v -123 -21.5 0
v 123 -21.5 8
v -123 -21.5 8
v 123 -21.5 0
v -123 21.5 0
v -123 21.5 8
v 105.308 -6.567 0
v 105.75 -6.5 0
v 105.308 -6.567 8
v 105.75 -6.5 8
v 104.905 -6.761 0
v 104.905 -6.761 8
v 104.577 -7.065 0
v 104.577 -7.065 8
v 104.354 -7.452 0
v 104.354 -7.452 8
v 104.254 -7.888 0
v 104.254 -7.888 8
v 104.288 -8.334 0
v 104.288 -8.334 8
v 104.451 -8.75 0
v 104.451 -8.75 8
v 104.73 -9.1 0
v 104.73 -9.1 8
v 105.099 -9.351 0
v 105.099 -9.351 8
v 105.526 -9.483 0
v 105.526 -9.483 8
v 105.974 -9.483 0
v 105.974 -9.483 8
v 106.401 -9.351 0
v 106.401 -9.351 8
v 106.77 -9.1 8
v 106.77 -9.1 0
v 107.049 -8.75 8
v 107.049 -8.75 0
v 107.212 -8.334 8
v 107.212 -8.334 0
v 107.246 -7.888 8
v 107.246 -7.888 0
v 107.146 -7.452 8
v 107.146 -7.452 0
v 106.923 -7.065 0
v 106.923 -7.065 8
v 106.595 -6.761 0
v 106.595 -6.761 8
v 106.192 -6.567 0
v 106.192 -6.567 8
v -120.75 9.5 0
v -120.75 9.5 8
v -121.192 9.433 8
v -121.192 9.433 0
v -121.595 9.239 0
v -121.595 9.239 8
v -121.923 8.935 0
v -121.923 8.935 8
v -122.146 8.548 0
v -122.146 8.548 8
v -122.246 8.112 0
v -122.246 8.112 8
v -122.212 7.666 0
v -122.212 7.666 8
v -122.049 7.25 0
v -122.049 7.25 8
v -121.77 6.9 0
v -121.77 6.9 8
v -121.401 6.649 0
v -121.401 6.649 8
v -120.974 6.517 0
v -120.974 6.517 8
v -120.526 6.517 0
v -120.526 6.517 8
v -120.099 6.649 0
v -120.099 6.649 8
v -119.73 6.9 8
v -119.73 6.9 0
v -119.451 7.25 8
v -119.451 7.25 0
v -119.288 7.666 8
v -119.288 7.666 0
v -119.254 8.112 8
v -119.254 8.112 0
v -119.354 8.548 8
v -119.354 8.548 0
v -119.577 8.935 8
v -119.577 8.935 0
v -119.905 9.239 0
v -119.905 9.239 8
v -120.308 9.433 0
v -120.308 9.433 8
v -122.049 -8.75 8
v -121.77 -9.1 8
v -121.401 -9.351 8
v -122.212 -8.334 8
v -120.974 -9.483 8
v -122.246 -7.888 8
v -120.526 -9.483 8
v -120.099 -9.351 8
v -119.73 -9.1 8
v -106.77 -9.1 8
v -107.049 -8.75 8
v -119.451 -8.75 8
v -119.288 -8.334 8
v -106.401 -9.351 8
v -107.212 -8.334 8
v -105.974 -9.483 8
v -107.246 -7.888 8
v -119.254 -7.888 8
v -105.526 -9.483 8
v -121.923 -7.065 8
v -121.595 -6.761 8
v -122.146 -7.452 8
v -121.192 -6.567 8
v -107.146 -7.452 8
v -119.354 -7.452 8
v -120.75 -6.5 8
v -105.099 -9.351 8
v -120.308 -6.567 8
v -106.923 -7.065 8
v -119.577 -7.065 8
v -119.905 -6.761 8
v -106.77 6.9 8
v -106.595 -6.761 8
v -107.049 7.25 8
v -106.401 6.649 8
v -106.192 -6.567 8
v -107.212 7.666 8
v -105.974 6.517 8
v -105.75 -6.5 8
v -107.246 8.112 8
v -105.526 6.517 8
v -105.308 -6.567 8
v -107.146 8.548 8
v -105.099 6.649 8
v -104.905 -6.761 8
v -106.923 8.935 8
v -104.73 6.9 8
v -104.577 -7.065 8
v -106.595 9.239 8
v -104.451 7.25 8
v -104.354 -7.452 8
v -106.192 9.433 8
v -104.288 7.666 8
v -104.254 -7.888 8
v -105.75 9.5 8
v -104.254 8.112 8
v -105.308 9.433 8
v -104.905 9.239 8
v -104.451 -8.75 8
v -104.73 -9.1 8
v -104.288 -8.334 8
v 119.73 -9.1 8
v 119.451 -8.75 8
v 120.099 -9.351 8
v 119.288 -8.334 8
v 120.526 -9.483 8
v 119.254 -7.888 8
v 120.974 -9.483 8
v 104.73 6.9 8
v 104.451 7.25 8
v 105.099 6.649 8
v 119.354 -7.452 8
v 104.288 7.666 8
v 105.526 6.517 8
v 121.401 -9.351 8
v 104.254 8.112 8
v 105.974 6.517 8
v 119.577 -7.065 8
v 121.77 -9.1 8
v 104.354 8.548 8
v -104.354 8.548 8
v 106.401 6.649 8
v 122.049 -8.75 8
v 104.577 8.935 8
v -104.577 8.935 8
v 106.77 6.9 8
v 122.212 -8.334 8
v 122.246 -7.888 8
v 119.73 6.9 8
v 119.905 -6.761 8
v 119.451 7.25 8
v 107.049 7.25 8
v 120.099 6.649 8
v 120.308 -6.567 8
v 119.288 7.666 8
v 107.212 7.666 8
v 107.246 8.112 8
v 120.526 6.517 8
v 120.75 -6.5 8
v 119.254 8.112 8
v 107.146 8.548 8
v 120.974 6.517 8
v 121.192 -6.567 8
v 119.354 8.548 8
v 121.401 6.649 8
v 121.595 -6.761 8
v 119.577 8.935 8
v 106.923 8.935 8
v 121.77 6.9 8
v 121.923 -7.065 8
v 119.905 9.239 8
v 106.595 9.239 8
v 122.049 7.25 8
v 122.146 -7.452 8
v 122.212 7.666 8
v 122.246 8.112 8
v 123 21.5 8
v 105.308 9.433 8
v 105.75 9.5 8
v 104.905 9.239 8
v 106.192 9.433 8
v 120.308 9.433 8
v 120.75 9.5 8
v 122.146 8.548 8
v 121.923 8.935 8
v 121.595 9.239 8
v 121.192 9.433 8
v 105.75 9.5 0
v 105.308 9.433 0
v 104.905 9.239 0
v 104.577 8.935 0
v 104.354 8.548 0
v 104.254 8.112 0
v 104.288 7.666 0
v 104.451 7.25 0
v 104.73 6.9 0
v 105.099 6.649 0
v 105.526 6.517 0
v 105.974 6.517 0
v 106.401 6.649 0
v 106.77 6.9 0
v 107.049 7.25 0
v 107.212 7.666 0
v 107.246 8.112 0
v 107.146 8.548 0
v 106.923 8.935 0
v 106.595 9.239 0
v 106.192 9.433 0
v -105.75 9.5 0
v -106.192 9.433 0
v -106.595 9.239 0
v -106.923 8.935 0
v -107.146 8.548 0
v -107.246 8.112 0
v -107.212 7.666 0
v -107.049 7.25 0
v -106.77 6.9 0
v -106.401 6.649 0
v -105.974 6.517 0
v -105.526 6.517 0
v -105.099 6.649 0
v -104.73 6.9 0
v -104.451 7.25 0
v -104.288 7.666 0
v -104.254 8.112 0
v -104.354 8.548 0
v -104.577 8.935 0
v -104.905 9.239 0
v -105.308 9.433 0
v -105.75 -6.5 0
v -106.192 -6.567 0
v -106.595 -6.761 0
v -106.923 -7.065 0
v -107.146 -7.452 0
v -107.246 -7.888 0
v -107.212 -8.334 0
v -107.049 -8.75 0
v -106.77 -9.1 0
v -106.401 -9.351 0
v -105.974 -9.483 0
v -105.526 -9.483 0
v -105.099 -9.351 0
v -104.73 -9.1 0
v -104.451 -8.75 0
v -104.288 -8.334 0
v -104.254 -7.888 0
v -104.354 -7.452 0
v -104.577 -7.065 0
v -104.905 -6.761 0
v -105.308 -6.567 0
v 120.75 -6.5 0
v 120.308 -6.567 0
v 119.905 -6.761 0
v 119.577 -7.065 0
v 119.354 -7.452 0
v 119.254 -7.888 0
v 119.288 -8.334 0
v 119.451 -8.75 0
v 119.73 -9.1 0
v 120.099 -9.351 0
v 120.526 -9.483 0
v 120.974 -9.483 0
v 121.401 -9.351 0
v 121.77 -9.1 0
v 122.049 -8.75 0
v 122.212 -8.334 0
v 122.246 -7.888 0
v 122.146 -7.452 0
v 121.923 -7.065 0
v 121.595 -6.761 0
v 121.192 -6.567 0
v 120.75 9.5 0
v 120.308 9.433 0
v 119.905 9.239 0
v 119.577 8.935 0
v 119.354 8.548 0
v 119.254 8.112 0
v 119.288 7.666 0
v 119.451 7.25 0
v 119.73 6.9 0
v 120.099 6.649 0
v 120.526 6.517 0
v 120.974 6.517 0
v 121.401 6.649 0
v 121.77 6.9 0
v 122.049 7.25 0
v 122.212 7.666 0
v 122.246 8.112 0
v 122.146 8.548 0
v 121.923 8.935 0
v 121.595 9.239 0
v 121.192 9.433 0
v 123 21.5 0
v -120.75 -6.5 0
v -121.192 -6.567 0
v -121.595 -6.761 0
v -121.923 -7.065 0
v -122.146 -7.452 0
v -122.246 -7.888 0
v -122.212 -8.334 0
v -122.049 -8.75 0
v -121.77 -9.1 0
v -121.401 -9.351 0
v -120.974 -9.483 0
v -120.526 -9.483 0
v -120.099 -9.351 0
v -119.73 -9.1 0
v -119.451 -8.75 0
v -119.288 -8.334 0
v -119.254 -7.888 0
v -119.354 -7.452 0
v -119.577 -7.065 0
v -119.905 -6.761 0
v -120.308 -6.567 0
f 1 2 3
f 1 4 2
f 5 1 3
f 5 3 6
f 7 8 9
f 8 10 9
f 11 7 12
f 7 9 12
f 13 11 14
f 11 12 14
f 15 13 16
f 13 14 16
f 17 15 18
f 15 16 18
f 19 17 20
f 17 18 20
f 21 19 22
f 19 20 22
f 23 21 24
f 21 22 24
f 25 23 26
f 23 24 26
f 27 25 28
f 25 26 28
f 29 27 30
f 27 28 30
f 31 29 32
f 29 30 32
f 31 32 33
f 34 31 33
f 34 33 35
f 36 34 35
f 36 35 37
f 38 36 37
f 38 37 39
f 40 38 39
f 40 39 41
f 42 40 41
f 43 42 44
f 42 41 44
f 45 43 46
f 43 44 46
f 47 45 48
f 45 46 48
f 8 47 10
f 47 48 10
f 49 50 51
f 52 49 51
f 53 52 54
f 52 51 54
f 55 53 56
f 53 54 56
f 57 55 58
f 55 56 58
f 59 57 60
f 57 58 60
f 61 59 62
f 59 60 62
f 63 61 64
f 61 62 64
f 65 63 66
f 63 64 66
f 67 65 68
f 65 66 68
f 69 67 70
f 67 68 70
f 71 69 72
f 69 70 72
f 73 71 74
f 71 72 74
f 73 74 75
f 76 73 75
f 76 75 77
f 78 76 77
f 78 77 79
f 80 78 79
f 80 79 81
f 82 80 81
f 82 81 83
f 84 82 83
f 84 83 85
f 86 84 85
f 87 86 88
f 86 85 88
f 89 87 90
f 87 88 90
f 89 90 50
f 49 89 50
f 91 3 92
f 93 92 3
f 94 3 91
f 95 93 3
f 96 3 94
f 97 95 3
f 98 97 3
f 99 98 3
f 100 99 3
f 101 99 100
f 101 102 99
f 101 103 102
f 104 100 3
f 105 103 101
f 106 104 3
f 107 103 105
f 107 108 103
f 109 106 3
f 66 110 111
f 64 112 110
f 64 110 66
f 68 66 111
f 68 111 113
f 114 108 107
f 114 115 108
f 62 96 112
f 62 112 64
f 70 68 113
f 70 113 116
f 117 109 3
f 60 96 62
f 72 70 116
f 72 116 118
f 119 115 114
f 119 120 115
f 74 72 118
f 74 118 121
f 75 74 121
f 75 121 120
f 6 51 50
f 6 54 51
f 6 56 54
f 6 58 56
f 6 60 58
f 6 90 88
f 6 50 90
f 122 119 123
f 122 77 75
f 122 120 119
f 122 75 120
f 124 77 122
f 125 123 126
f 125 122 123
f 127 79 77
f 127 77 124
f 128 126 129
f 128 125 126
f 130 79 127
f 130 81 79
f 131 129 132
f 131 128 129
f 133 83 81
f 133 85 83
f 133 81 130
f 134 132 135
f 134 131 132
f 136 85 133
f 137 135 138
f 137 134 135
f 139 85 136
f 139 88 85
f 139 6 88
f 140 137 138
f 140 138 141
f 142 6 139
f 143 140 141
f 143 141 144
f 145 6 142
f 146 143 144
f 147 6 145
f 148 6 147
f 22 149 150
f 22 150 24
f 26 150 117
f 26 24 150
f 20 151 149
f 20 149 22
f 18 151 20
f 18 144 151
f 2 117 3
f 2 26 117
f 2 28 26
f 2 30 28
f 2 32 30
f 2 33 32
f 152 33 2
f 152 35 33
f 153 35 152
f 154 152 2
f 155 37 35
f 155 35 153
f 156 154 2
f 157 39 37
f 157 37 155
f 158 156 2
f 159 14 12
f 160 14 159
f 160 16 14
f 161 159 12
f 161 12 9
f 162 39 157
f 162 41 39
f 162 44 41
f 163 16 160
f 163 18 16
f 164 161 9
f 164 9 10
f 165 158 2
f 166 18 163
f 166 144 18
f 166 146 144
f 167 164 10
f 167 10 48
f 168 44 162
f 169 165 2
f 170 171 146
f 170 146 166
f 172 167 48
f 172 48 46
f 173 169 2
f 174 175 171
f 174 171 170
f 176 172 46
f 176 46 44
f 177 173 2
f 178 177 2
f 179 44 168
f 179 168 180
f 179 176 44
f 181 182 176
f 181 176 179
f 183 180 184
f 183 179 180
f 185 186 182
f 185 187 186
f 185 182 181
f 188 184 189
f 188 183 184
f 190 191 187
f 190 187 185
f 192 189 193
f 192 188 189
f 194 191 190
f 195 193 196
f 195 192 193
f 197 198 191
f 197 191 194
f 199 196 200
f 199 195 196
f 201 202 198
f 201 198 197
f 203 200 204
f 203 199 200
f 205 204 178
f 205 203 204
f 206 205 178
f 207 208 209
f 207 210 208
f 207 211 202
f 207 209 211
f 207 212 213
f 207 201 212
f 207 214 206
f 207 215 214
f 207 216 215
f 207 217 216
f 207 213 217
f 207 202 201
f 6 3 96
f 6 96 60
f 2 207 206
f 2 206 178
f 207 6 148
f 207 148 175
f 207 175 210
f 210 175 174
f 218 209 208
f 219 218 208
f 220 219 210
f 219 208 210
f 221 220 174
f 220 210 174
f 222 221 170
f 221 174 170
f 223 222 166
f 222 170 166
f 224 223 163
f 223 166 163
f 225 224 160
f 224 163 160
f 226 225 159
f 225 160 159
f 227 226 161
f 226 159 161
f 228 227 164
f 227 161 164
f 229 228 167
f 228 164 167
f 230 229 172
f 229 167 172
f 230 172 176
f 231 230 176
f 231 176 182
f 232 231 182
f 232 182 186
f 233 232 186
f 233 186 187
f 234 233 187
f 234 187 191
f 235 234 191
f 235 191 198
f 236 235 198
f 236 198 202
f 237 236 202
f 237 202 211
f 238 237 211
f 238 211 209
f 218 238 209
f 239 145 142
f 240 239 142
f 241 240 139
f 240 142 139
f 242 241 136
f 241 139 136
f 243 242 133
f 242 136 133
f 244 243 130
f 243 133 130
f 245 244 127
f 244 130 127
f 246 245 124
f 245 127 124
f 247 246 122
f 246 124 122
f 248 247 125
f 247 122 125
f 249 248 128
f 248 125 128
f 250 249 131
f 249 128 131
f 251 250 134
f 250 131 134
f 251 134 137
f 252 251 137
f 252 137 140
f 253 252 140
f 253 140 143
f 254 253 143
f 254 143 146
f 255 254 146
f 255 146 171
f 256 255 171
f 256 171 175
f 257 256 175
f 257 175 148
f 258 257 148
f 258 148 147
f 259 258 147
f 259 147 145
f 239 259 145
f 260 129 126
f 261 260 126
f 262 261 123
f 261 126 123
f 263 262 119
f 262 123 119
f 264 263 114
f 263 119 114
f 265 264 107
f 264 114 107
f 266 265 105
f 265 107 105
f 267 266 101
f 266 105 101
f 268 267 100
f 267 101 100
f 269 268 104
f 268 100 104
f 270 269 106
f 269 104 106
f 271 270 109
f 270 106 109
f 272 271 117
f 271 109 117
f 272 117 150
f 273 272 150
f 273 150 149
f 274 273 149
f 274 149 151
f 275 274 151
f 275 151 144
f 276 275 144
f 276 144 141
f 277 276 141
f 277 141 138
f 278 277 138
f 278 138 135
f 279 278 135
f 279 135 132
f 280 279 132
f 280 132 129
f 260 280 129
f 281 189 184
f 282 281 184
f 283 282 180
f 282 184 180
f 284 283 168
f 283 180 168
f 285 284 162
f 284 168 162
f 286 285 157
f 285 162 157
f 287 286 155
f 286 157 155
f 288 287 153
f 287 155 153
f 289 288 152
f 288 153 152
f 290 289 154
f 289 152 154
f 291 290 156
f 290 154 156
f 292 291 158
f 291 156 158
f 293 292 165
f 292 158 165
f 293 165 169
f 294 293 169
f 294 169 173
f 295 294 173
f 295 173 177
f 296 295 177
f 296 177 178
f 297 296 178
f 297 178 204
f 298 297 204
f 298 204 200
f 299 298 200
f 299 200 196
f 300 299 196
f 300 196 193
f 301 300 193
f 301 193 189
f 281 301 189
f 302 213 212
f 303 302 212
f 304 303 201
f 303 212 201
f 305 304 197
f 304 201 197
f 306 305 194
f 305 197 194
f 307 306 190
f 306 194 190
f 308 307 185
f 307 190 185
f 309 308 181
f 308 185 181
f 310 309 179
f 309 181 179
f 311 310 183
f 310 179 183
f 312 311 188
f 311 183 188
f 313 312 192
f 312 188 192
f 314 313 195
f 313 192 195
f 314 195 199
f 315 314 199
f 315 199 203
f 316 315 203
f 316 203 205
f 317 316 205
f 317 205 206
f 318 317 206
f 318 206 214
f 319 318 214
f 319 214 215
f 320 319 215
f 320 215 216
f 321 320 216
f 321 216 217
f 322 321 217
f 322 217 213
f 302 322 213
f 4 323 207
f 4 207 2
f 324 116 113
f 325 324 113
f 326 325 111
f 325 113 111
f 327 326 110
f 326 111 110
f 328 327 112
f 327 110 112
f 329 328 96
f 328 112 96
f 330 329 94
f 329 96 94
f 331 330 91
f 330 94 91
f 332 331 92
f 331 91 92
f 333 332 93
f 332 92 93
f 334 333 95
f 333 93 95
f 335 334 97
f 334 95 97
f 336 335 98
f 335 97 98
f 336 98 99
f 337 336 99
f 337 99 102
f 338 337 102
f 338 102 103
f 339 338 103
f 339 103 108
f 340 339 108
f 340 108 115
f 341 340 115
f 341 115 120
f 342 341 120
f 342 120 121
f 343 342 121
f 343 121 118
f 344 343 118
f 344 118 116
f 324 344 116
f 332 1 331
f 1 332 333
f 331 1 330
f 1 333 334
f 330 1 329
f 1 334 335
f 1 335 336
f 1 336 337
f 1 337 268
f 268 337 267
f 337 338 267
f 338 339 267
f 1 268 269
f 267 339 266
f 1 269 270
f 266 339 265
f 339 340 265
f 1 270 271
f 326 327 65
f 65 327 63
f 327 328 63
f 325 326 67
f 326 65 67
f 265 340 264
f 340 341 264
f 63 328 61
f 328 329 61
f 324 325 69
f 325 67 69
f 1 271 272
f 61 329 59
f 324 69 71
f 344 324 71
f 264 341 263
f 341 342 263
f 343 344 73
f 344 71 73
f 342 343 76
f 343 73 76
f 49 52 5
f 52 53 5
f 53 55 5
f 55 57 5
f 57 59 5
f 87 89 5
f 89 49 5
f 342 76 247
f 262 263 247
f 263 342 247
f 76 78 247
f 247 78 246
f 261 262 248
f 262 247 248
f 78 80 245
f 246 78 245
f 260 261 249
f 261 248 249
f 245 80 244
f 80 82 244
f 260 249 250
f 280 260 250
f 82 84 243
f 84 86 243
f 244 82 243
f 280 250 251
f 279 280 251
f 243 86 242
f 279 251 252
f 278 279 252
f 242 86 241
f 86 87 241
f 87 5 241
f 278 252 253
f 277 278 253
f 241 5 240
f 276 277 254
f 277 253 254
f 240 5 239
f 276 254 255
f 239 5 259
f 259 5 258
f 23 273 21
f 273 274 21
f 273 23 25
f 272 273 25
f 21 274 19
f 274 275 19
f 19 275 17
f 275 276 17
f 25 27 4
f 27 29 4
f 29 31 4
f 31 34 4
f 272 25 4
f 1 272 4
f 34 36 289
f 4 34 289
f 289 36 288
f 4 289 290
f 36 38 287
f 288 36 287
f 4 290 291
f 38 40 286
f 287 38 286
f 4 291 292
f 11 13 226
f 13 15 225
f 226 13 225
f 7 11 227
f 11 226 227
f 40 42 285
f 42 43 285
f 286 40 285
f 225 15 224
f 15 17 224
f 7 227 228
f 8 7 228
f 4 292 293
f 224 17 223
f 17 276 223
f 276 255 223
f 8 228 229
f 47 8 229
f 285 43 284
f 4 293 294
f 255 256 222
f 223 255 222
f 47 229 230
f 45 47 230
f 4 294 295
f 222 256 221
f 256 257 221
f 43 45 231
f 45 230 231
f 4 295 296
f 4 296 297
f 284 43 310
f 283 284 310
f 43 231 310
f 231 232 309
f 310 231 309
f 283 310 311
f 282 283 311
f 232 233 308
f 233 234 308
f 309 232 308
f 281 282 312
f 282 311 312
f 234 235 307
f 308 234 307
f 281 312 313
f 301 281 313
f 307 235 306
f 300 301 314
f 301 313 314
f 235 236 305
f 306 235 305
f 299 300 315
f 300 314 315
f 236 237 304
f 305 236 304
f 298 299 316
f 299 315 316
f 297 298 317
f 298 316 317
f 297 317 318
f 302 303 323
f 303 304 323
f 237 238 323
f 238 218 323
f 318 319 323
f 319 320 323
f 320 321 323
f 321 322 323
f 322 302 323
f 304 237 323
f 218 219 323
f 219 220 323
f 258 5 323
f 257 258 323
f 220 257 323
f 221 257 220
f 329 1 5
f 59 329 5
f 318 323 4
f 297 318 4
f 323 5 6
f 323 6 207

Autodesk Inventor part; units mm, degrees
ref_plane "YZ Plane" through (0, 0, 0) normal (1, 0, 0) x (0, 1, 0)
ref_plane "XZ Plane" through (0, 0, 0) normal (0, 1, 0) x (-1, 0, 0)
ref_plane "XY Plane" through (0, 0, 0) normal (0, 0, 1) x (1, 0, 0)
sketch "Sketch1" plane through (0, 0, 0) normal (0, 0, 1) x (1, 0, 0)
  line L0 (-123, 21.5) -> (123, 21.5)
  line L1 (123, 21.5) -> (123, -21.5)
  line L2 (123, -21.5) -> (-123, -21.5)
  line L3 (-123, -21.5) -> (-123, 21.5)
  line L4 (-123, 21.5) -> (123, -21.5) construction
  line L5 (123, 21.5) -> (-123, -21.5) construction
  line L6 (0, -155.5635) -> (155.5635, 0) construction
  line L7 (155.5635, 0) -> (0, 155.5635) construction
  line L8 (0, 155.5635) -> (-155.5635, 0) construction
  line L9 (-155.5635, 0) -> (0, -155.5635) construction
  line L10 (0, -155.5635) -> (0, 155.5635) construction
  line L11 (155.5635, 0) -> (-155.5635, 0) construction
  line L12 (0, -155.5635) -> (220, -155.5635) construction
  line L13 (-120.75, -8) -> (120.75, -8)
  line L14 (120.75, -8) -> (120.75, 8)
  line L15 (120.75, 8) -> (-120.75, 8)
  line L16 (-120.75, 8) -> (-120.75, -8)
  line L17 (-120.75, -8) -> (120.75, 8) construction
  line L18 (120.75, -8) -> (-120.75, 8) construction
  line L19 (-105.75, -8) -> (105.75, -8)
  line L20 (105.75, -8) -> (105.75, 8)
  line L21 (105.75, 8) -> (-105.75, 8)
  line L22 (-105.75, 8) -> (-105.75, -8)
  line L23 (-105.75, -8) -> (105.75, 8) construction
  line L24 (105.75, -8) -> (-105.75, 8) construction
  point P0 (0, 0)
  dimension "d0" = 246
  dimension "d1" = 220
  dimension "d2" = 45
  dimension "d3" = 220
  dimension "d4" = 43
  dimension "d5" = 241.5
  dimension "d6" = 16
  dimension "d7" = 15
extrude "Extrusion1" add sketch "Sketch1" along normal blind 8 contours L0 L1 L2 L3 | L16 L15 L22 L13 | L22 L15 L20 L13 | L20 L15 L14 L13
hole "Hole1" at (-105.75, -8, 0) at (-120.75, -8, 0) at (-120.75, 8, 0) at (-105.75, 8, 0) at (120.75, -8, 0) at (105.75, -8, 0) at (105.75, 8, 0) at (120.75, 8, 0) direction (0, 0, 1) diameter 3 end through all
properties material "ABS Plastic"
